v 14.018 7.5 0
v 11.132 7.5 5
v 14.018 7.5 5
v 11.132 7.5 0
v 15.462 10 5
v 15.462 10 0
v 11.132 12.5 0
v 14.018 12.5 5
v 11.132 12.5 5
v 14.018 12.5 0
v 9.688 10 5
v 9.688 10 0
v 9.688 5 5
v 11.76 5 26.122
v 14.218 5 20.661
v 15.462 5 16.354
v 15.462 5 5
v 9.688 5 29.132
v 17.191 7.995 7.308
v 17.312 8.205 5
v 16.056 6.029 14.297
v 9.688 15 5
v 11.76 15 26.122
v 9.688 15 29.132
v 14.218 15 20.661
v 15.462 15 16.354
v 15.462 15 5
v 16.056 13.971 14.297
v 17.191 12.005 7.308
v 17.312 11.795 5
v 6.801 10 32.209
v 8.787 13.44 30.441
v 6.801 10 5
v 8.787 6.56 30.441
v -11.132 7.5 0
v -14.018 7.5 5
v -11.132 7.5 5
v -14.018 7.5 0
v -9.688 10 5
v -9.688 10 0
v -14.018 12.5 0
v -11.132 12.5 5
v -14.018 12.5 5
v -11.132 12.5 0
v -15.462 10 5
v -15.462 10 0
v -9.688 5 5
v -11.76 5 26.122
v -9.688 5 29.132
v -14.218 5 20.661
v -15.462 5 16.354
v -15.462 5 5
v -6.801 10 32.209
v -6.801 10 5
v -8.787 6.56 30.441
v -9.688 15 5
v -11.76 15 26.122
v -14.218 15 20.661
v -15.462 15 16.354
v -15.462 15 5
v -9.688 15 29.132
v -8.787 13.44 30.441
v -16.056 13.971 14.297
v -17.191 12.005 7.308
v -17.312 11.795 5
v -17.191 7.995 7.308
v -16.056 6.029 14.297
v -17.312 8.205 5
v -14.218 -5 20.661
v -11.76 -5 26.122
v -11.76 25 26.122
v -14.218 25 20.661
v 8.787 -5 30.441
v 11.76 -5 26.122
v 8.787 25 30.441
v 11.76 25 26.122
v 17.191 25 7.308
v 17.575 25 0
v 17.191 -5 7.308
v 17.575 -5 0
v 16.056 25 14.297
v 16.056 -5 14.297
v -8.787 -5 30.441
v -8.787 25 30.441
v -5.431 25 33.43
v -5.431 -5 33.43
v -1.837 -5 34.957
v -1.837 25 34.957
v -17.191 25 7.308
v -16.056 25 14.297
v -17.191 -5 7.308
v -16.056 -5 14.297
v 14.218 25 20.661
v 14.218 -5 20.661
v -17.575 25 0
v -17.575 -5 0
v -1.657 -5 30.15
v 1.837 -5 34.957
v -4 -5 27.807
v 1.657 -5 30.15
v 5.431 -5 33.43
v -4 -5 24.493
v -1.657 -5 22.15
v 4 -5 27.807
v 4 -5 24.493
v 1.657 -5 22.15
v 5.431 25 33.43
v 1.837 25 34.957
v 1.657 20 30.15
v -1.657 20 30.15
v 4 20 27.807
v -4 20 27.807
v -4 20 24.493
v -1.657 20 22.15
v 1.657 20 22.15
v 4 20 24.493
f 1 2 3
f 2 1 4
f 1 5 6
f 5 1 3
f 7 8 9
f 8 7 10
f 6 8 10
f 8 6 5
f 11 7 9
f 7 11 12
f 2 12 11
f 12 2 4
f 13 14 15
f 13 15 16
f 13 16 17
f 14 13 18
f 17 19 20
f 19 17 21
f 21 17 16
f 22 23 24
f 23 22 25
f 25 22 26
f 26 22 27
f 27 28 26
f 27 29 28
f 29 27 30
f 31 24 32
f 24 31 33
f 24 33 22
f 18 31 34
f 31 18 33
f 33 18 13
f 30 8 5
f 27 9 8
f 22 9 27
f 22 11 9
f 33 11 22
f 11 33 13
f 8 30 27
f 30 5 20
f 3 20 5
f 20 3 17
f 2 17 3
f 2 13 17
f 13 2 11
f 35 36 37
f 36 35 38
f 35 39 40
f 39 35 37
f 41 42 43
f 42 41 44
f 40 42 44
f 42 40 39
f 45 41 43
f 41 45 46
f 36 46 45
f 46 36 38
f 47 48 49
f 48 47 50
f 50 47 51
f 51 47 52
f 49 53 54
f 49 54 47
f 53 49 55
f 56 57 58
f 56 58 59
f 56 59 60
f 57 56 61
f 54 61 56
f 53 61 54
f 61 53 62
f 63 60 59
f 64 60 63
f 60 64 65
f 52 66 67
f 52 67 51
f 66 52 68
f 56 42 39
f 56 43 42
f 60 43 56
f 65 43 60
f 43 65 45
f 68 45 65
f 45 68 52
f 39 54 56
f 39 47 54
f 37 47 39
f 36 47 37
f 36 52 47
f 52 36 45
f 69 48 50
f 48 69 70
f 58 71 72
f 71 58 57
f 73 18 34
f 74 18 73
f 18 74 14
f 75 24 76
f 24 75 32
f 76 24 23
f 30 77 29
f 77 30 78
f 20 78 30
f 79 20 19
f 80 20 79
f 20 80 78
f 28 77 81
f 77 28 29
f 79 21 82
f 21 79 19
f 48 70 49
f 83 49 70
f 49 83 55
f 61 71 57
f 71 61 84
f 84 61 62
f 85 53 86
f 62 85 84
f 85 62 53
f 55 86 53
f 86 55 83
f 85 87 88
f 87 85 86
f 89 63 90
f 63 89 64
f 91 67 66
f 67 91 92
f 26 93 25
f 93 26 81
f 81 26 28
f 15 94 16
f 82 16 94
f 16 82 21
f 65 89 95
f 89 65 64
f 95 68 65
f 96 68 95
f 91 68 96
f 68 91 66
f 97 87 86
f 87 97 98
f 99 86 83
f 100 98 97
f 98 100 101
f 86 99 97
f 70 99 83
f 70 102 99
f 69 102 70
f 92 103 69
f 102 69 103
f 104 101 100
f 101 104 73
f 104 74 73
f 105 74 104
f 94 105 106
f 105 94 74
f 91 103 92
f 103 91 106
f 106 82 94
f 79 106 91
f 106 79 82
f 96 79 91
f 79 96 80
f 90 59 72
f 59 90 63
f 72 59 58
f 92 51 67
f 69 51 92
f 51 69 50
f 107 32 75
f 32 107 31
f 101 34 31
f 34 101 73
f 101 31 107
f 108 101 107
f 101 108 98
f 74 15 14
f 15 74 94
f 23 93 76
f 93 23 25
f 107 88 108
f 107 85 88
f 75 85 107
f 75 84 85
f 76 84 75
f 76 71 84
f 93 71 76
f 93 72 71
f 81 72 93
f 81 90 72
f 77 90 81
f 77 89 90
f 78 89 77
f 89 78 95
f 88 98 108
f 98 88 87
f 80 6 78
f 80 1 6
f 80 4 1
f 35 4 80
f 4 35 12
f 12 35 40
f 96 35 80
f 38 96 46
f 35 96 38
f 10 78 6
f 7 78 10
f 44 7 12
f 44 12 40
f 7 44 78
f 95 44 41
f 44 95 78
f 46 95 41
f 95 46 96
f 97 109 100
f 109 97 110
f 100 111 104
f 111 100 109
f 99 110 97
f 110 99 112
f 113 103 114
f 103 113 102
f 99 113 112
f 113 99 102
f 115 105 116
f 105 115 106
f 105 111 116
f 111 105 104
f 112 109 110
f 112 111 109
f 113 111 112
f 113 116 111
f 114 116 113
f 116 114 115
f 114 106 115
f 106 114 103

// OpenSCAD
// file: vars.scad
// Variables used throughout design.
// Yes, these could use some commenting.
// (c) 2014, Christopher "ScribbleJ" Jansen

// Printer outside dimensions are actually this + corner_thick*2.
printer_w = 400;
printer_l = 400;
printer_h = 400;

// Used wherever I need something arbitrarily large.
huge=500;

// 608 Bearings
//Added some extra space to the bearing retainer so I don't break them during assembly
bearing_w = 7*1.01;  
bearing_d = 22*1.01;
bearing_r = bearing_d/2;
bearing_hole_d = 8;
bearing_hole_r = bearing_hole_d/2;

// Miscellaneous bolts, M3
misc_bolt_d = 3.2;
misc_bolt_r = misc_bolt_d/2;
misc_nut_r  = misc_bolt_d;
misc_bolt_pitch = 0.5;
misc_bolthead_d = misc_bolt_d*2;
misc_bolthead_r = misc_bolthead_d/2;

//Retainer for using a regular bolt (M8) instead of a proper leadscrew as the Z lift nut.
liftNut_d = 8;
liftNut_od = liftNut_d *2;
liftNut_h = liftNut_d * 0.8;
liftNutRetainer_h = liftNut_h ;

// Bearing retainers
//Added some extra thickness to the bearing retainer so I don't break them during assembly
retainer_shell_thick = 0.6;
retainer_shell_sep   = 0.25;
retainer_lip_thick   = 2;
retainer_inner_width = 1;

// GT2, 2mm belting
belt_w    = 6;
belt_thick= 2;
belt_sep  = retainer_lip_thick*2 + 2;

// Some calculated info about the bearing retainers.
calc_retainer_h  = retainer_lip_thick*2 + belt_w;
calc_retainer_ir = bearing_r + retainer_shell_thick*2 + retainer_shell_sep;
calc_retainer_or = calc_retainer_ir + belt_thick;
calc_retainer_b_off = retainer_lip_thick - (bearing_w-belt_w)/2;

// 20mm Tslot and associated bolt dimensions
tslot_w = 20;
tslot_bolt_d = 5;
tslot_bolt_r = tslot_bolt_d/2;
tslot_bolt_l = 4;
tslot_bolthead_d = 10;
tslot_bolthead_r = tslot_bolthead_d/2;

// This variable is called corner_thick, but it's used pretty much everywhere something needs to be sturdy but thin, not
// just on the corners.
// TODO: Anywhere it's used that's not a corner, I should make a new variable for that thing.
corner_thick = 5;
corner_length = tslot_w*3;

// 8mm Smooth Rod dimensions
rod_d=8;
rod_r=rod_d/2;

// Named because they were originally bronze bushings, now expects to be LM8UU.
bushing_d=15;
bushing_r=bushing_d/2;
bushing_l=10;
bushing_flange_r = bushing_r+3;
bushing_flange_w = 1;
bushing_material_thick = 5;

// X Axis dimensions
x_rod_sep = 50;
x_carriage_l = 50;
x_mount_sep_x = x_carriage_l - misc_bolthead_r*2*2 - misc_bolt_r*2;
x_mount_offset = bushing_r + misc_bolt_r * 2;
belt_above_x = bushing_r+misc_nut_r*2;
belt_clamp_w = 7;
x_rod_past_bearing = 20;

// Y Axis dimensions
belt_above_y = 45;
y_above_x = belt_above_x-belt_above_y;


// The standoffs for the belt idler bearings.
bearing_mount_base = corner_thick;
bearing_mount_extra = 2;
belt_above_bearing_mount = bearing_mount_base + bearing_mount_extra + retainer_lip_thick;
bearing_mount_support_tweak = 30;
y_bearing_offset = bushing_r+bushing_material_thick-calc_retainer_ir;
y_bearing_sep_y = calc_retainer_ir*2+belt_thick;
y_bearing_sep_z = belt_w+belt_sep;
bearing_bolt_r  = 4;
bearing_bolt_pitch = 1.25;
bearing_bolt_holder_thick = 4;

// Gap between Y carriage and T-slot
y_carriage_from_tslot = 2;

// 50mm Y-carriage length fits 2 LM8UU
y_carriage_len = 50;

// NEMA17 Motor Dimensions
motor_w = 42.3;
motor_h = motor_w;
motor_bolt_sep = 31.0;
motor_bolt_r   = 1.5;
// Dimensions of pulleys on X/Y Motors
motor_pulley_d = 10;
motor_pulley_r = motor_pulley_d/2;
motor_pulley_h = 5.3;  // This is the distance the pulley is above the motor body, not the height of the pulley itself.
motor_flange_d = 23;
motor_flange_r = motor_flange_d/2;
// This creates an extra hole in the motor corner for T-slot mounting, because the spaces for the motor mounts may coincide 
// with one of the standard holes.
motor_corner_extra_hole_pos = tslot_bolt_r+3;

// Some useful precalculated values
calc_corner_from_y_rod = x_rod_past_bearing+corner_thick+y_carriage_from_tslot+tslot_w;
calc_corner_above_x = belt_above_x - belt_above_bearing_mount + bearing_mount_base;
calc_motor1_above_x  = belt_above_x - motor_pulley_h;
calc_motor2_above_x  = belt_above_x - motor_pulley_h + belt_w + belt_sep;
calc_motor_from_y_rod = -bushing_r - bushing_material_thick + bearing_bolt_holder_thick + bearing_bolt_r + calc_retainer_or + motor_pulley_r;

// Motor bracket thick is 12 because I'm using M3x16 to mount the motors and the bolts can fit about 4mm into a NEMA17.
motor_bracket_thick = 12;
motor_bracket_wide = (motor_w - motor_flange_d) / 2;
motor_bracket_len  = motor_w;
motor_bolt_offset  = (motor_w - motor_bolt_sep) / 2;

// How far apart the Z smooth rods should be
z_rod_sep = 150;
z_motor_off = motor_h - tslot_w - corner_thick;

// Very important to set this for your lasercut Z, the thickness of the material you are lasering.
laser_mat_thick = 4.75;
// Laser mat margin is how much material is required outside of a tabslot.
laser_mat_margin = laser_mat_thick;
// Distance between heated bed holes, 209 is standard for a reprap heated bed
bed_mount_sep   = 209;
// Bed mounting holes will be created centered on the Z platform, and another set offset at this distance from the smooth rod:
bed_from_z      = 60;
// bed_box_r and bed_box_h here will exactly fir the lm8uu holders.  Decrease at your own peril.
bed_box_r       = 25;
bed_box_h       = 50;
z_ends_sep = printer_l - tslot_w*2 - corner_thick*2 - motor_w;
platform_l      =  laser_mat_margin*2 + laser_mat_thick*2 + bed_box_r*2 + z_ends_sep;
platform_w      = bed_mount_sep + misc_bolt_r*2 + laser_mat_margin*2;
// These settings for the leadscrew fit the leadscrews sold by MakersToolWorks
z_leadscrew_passthrough_r = 12/2;
leadscrew_bolt_offset = 22/2;
leadscrew_bolt_r = 3.2/2;
laser_bushing_fudge = 0.1; // No longer used since the change to lm8uu


// LM8UU bearing dimensions
lm8uu_d=15;
lm8uu_r=lm8uu_d/2;
lm8uu_l=24;
// The nut and bolt here refer to the ones used in the Z axis' four LM8UU holders.
lm8uu_bolt_r=5/2;
lm8uu_nut_r=10/2;

arduino_width=60;
// file: common.scad
// Common functions used in various places throughout.
// (c) 2014, Christopher "ScribbleJ" Jansen
include <vars.scad>

// Reduce radius of holes intended to hold bolts by threads.
// 0.86603 * p = nominal depth of threads.  1/3-1/2 of that is about right.
function smallhole(r,p) = r - ((p*0.86603)/3);

// Polyhole derived from Nophead's Polyhole work: http://hydraraptor.blogspot.com/2011/02/polyholes.html
module polyhole(r,h,v=6,a=0)
{
  rotate([0,0,a]) cylinder( h = h, r = r  / cos( 180 / v ), $fn = v );
}
// 2D version of Polyhole
module polycircle(r,v=6,a=0)
{
  rotate([0,0,a]) circle(r = r  / cos( 180 / v ), $fn = v );
}
// Cutout for bolthole
module bolt(bolt_r = misc_bolt_r,bolthead_r = misc_bolthead_r,bolt_len = huge,v=6,a=0)
{
  translate([0,0,-bolt_len]) polyhole(r=bolt_r,h=bolt_len+1,v=v,a=a);
  polyhole(r=bolthead_r,h=huge,v=v,a=a);
}
// 2D ring
module ring(inner=5,outer=10,v=32)
{
  difference()
  {
    circle(r=outer);
    polycircle(r=inner,v=v);
  }
} 
// 2D Rounded square
module roundsquare(dim=[50,50],r=5)
{
  translate([0,r]) square([dim[0], dim[1] - r*2]);
  translate([r,0]) square([dim[0] - r*2, dim[1]]);
  for(x=[r,dim[0]-r])
  for(y=[r,dim[1]-r])
    translate([x,y]) circle(r=r);
}
// Lasercutting Tabs
module maketabs(l=100,w=5,num=10)
{
  tablength=l/(num * 2);
  for(x=[tablength/2:tablength*2:l])
    translate([x,0]) square([tablength,w]);
}
// Support for printing bearing mount
module support(l=bearing_mount_base+bearing_mount_extra+y_bearing_sep_z+calc_retainer_b_off,w=bearing_hole_d * tan(180/6) *2,extra=0,extra_l=0)
{
  translate([-w/2,0,-l]) 
  {
    difference()
    {
      rotate([45,0,0]) cube([w,huge/2,huge/2]);
      translate([-huge/2,0,0]) cube([huge,huge,huge]);
      translate([-huge/2,-huge/2,l]) cube([huge,huge,huge]);
    }
    translate([0,-extra,-extra_l/2]) cube([w,extra,extra_l]);
  }

}
// main file
// Z rod holder
// Print 4
// (c) 2014, Christopher "ScribbleJ" Jansen
include <common.scad>
use <platform.scad>

z_rod_holder();

module z_rod_holder()
{
  rod_holder_r = motor_w/2 + bushing_material_thick + corner_thick + rod_r;

  difference()
  {
    translate([0,-corner_thick,0]) scale([0.5,1,1]) rotate([-90,0,0]) cylinder(r=rod_holder_r, h=tslot_w+corner_thick*2);

    // Garbage
    translate([-huge/2,-huge/2,-huge]) cube([huge,huge,huge]);

    // Rod Hole
    translate([0,tslot_w,corner_thick + motor_w/2])
      rotate([90,0,0])
        polyhole(r=rod_r,h=huge,v=8,a=360/16);

    // Tslot bolts
    for(x=[rod_holder_r/2 - tslot_bolthead_r,-rod_holder_r/2 + tslot_bolthead_r])
    {
      translate([x,tslot_w/2,corner_thick]) bolt(tslot_bolt_r,tslot_bolthead_r);
    }

  }

}
